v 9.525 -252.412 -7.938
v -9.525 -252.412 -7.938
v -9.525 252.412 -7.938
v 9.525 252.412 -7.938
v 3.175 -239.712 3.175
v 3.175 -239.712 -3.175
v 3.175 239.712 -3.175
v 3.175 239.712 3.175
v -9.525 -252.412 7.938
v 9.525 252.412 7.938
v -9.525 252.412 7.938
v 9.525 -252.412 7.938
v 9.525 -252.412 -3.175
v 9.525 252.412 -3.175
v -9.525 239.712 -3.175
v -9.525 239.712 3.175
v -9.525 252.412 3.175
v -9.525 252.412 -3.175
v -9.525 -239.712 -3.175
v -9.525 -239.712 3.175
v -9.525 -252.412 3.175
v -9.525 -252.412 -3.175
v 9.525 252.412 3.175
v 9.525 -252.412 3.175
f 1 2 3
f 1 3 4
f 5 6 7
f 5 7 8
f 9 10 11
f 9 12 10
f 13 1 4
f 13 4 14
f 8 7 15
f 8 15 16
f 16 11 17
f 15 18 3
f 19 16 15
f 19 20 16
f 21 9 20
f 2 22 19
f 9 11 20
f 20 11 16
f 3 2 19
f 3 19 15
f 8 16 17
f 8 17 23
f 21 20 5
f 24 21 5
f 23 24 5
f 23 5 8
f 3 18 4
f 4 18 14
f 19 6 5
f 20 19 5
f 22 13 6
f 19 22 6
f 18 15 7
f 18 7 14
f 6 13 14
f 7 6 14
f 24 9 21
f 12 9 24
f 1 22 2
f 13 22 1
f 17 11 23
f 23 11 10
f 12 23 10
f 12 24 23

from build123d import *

# Parameters (mm, degrees)
F1_DEPTH      = 252.4125
F2_W          = 12.7
F2_H          = 6.35
F3_DEPTH      = 9.526
F3_DEPTH_BACK = 9.526


with BuildPart() as f1:
    # F0 (on Front) → F1 (new body, symmetric)
    with BuildSketch(Plane.XZ):
        Polygon((9.525, 7.9375), (-9.525, 7.9375), (-9.525, -7.9375), (9.525, -7.9375), (9.525, -3.175), (3.175, -3.175), (3.175, 3.175), (9.525, 3.175), align=None)
    extrude(amount=F1_DEPTH, both=True)

    # F2 (on Right) → F3 (cut, two sides)
    with BuildSketch(Plane.YZ) as f3_sk:
        with Locations((-246.0625, 0)):
            Rectangle(F2_W, F2_H)
        with Locations((246.0625, 0)):
            Rectangle(F2_W, F2_H)
    extrude(amount=-F3_DEPTH, mode=Mode.SUBTRACT)
    extrude(f3_sk.sketch, amount=F3_DEPTH_BACK, mode=Mode.SUBTRACT)


solid = f1.part
